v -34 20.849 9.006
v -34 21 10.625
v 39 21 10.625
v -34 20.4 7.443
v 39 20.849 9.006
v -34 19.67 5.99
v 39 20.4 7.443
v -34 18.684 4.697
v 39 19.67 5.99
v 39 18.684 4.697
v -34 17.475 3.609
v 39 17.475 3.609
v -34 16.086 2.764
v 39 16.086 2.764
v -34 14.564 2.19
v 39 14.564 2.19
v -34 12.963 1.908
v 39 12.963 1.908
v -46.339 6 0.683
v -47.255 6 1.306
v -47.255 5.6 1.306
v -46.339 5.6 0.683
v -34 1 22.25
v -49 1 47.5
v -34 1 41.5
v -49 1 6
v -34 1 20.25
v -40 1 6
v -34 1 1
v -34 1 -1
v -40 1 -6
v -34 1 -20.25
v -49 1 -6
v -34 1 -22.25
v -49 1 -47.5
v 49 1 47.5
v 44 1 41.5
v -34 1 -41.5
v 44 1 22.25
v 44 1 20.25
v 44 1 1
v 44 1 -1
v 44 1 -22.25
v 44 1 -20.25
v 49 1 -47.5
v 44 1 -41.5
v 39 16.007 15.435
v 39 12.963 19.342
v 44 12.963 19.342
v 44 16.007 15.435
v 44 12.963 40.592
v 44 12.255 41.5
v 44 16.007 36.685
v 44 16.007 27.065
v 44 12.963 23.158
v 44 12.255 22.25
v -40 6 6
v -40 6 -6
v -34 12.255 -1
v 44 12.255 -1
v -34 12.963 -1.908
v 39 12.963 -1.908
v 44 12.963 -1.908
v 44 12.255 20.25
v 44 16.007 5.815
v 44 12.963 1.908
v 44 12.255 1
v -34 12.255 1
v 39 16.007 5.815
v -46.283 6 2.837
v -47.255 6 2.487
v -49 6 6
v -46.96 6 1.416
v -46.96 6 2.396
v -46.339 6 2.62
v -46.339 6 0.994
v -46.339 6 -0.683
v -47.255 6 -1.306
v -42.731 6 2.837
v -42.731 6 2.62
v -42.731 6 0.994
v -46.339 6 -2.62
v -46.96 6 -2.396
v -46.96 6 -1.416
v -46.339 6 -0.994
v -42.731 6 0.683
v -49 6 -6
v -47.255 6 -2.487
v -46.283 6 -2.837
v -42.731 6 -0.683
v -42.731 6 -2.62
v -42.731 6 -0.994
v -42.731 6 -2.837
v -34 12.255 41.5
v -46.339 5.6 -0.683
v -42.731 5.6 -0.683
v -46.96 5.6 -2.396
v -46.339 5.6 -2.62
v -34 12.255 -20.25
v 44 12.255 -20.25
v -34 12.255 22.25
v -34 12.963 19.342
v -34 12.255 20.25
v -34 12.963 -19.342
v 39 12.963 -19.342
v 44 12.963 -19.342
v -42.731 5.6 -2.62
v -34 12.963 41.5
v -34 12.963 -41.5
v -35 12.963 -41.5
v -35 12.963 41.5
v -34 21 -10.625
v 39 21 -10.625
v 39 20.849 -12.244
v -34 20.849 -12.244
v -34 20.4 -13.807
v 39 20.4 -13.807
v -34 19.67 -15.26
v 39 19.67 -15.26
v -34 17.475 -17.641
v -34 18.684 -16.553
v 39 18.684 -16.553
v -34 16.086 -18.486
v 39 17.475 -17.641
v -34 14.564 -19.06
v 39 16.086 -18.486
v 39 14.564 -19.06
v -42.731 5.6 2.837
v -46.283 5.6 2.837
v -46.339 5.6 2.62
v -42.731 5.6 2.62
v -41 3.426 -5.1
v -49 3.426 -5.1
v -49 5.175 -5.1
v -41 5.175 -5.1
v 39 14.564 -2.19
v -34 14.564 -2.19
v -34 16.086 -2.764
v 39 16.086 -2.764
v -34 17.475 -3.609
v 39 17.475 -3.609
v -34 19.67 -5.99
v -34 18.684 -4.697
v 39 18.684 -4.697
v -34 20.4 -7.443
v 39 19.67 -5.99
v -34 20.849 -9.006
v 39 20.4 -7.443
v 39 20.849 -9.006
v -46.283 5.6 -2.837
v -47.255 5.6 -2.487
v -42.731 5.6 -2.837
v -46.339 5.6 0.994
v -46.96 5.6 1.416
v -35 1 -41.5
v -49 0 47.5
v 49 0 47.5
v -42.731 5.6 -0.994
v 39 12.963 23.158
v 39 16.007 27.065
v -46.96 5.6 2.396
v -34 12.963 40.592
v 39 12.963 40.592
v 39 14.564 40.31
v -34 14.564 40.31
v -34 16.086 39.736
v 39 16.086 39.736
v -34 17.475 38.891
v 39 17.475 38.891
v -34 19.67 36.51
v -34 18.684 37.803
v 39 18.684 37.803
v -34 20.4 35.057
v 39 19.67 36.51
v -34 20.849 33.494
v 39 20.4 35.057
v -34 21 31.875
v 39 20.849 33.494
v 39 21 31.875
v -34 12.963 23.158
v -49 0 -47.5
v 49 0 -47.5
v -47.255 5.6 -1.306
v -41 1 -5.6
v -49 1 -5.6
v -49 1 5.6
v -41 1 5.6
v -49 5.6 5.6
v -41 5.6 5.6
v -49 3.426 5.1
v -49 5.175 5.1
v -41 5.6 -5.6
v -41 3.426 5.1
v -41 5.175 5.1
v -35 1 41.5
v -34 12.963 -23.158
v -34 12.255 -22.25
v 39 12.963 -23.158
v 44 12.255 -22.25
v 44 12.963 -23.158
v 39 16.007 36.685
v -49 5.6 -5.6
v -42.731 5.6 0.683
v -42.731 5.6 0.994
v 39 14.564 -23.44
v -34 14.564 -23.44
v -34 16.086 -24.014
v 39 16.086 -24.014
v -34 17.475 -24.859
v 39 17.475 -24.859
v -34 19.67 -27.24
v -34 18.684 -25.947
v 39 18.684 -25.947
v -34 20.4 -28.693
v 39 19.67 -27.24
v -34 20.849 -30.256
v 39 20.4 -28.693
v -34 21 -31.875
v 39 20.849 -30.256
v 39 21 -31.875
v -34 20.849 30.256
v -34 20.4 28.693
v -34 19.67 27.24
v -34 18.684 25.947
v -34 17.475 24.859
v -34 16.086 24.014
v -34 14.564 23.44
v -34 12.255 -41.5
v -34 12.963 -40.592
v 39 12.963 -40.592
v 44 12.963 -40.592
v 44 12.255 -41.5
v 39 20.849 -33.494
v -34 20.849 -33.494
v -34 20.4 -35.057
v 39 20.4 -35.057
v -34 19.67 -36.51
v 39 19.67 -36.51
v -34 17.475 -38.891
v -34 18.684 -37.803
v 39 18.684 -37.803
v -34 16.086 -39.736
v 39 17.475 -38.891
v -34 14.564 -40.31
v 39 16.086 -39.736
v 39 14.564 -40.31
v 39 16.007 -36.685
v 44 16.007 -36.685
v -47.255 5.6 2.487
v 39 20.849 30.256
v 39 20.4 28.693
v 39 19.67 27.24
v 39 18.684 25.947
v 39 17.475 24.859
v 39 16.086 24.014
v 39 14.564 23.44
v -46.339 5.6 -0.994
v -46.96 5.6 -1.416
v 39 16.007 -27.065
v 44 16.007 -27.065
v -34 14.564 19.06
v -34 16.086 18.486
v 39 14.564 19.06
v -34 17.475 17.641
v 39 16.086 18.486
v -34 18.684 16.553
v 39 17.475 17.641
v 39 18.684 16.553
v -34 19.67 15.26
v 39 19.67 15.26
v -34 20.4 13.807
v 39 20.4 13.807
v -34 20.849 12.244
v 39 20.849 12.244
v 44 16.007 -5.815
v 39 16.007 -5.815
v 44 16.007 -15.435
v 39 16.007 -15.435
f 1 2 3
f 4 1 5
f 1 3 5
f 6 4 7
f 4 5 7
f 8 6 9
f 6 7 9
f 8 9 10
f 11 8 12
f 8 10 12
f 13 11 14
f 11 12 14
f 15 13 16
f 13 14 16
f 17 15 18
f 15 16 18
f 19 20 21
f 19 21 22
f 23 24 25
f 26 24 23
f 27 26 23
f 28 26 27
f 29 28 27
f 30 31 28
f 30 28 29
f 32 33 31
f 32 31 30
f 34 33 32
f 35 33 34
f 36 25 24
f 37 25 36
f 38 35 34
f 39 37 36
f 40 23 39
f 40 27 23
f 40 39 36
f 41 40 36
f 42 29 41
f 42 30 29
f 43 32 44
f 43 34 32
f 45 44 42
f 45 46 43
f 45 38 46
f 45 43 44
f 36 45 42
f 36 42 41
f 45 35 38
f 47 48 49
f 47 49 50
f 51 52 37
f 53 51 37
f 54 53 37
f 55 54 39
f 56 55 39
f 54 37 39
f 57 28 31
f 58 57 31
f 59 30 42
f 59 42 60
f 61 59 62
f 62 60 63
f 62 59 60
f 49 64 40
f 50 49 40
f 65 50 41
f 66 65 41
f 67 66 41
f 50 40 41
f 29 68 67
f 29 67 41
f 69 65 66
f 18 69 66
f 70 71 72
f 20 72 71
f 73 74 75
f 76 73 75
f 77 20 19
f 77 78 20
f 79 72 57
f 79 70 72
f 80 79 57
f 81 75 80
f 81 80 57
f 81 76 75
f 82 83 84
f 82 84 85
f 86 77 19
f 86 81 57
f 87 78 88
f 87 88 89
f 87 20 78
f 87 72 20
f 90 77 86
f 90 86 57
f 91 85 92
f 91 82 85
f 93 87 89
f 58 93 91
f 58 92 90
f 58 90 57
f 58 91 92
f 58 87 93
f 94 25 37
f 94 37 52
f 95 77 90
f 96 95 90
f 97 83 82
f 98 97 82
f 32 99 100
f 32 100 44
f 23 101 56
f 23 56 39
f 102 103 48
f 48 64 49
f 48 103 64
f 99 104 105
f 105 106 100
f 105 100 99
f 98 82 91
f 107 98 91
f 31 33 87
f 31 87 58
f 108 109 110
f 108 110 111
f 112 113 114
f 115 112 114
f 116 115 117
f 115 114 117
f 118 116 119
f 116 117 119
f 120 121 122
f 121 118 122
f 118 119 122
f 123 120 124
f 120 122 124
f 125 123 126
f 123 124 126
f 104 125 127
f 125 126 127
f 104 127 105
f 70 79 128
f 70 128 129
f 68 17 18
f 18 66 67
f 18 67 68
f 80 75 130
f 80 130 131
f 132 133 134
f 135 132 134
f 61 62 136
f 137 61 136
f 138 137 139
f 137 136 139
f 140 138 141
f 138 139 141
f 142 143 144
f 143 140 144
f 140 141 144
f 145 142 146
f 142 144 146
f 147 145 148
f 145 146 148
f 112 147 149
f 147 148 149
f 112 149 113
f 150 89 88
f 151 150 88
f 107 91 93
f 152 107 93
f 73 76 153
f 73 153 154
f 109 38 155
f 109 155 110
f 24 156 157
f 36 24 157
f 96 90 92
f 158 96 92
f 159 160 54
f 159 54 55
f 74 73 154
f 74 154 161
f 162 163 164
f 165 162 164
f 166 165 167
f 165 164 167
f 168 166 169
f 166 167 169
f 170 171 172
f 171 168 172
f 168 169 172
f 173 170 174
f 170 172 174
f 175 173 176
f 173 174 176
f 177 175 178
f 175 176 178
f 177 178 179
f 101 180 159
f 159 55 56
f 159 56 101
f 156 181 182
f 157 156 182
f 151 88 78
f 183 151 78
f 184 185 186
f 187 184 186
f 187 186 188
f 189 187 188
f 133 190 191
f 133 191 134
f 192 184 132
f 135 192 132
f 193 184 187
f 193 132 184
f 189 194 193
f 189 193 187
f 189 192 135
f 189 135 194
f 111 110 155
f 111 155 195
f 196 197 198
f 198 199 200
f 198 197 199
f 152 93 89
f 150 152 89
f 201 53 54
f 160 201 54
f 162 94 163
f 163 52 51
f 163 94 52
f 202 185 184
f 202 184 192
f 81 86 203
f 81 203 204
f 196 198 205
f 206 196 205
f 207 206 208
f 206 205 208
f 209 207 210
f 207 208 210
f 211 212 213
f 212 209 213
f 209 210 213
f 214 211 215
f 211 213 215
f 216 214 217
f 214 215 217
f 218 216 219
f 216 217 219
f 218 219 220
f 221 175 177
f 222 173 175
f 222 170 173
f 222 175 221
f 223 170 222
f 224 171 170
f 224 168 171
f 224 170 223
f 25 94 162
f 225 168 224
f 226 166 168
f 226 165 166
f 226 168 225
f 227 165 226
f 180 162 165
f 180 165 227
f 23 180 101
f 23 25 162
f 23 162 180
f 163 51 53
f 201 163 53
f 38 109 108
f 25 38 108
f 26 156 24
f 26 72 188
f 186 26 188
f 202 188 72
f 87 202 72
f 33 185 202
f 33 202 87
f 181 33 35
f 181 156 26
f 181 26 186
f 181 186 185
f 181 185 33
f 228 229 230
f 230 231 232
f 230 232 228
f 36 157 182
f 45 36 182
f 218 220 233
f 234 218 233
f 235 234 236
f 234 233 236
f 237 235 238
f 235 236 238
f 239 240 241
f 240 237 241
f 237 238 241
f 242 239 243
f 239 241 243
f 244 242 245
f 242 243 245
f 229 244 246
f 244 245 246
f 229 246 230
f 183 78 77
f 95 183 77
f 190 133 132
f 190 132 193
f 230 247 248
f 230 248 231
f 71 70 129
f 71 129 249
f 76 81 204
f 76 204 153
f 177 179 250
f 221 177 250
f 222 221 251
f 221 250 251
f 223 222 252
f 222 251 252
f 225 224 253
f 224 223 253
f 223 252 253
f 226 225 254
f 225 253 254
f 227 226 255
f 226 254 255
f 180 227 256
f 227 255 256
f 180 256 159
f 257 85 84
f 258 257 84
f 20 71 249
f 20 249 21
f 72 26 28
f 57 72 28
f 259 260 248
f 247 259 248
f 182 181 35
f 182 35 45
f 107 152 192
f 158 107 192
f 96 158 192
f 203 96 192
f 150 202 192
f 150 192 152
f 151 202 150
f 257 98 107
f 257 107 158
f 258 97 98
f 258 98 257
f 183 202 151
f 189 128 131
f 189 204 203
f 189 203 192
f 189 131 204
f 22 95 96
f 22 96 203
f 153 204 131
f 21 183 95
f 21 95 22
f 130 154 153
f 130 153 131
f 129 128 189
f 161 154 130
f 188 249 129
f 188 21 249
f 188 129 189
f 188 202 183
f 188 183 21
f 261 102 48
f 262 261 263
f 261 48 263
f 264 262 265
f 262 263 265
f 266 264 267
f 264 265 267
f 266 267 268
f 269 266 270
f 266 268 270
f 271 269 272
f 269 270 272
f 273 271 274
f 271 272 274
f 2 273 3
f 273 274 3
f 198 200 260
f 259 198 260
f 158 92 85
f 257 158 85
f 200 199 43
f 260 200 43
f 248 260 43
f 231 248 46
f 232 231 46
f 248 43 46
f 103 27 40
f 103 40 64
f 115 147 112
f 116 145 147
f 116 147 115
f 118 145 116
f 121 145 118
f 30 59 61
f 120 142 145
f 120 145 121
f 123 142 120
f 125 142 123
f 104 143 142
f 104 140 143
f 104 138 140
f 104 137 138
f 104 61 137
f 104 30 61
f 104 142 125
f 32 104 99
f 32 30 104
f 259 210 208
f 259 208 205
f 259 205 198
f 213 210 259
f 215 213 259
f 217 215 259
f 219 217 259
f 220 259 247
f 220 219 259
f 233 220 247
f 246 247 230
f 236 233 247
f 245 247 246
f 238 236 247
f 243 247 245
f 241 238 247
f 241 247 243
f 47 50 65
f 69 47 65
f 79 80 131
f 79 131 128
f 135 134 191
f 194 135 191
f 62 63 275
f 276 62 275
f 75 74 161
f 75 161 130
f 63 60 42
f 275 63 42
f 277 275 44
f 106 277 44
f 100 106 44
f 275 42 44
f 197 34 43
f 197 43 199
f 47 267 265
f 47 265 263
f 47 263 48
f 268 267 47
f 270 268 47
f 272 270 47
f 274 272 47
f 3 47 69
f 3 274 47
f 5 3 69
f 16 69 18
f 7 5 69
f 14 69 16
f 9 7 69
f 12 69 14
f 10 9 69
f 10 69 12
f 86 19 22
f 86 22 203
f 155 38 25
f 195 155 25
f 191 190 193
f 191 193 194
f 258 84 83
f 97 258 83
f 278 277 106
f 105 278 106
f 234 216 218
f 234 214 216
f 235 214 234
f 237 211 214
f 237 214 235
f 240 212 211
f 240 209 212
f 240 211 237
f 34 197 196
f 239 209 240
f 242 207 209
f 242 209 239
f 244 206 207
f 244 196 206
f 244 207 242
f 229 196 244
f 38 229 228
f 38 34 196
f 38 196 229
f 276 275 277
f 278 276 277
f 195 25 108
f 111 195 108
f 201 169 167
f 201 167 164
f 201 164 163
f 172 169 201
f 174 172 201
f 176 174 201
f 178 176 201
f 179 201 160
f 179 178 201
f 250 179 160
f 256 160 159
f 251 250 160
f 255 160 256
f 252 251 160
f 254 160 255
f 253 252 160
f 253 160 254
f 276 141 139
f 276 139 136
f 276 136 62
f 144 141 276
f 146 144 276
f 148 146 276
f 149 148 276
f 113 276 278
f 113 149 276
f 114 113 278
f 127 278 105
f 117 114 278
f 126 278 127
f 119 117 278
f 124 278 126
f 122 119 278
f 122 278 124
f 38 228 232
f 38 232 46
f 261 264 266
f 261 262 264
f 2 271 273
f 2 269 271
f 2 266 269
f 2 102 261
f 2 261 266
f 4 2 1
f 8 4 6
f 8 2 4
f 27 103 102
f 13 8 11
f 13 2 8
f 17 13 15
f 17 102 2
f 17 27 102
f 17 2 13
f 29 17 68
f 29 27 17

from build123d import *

# Parameters (mm, degrees)
SKETCH_1_W          = 98
SKETCH_1_H          = 95
EXTRUDE_1_DEPTH     = 1
SKETCH_2_W          = 78
SKETCH_2_H          = 85
EXTRUDE_2_DEPTH     = 20
CUT_EXTRUDE_1_DEPTH = 100
CUT_EXTRUDE_2_DEPTH = 5
SKETCH_5_W          = 9
SKETCH_5_H          = 12
EXTRUDE_3_DEPTH     = 5
SKETCH_6_W          = 11.2
SKETCH_6_H          = 4.6
SKETCH_6_W_2        = 10.2
SKETCH_6_H_2        = 1.749108458
CUT_EXTRUDE_4_DEPTH = 8
CUT_EXTRUDE_5_DEPTH = 0.5
SKETCH_8_W          = 83
SKETCH_8_H          = 11.962724137
EXTRUDE_4_DEPTH     = 1


with BuildPart() as part:
    # 스케치1 → 보스-돌출1 (new body)
    with BuildSketch(Plane(origin=(0, 0, 0), x_dir=(1, 0, 0), z_dir=(0, 1, 0))):
        Rectangle(SKETCH_1_W, SKETCH_1_H)
    extrude(amount=EXTRUDE_1_DEPTH)

    # 스케치2 → 보스-돌출2 (add)
    with BuildSketch(Plane(origin=(0, 1, 0), x_dir=(1, 0, 0), z_dir=(0, 1, 0))):
        with Locations((5, 0)):
            Rectangle(SKETCH_2_W, SKETCH_2_H)
    extrude(amount=EXTRUDE_2_DEPTH)

    # 스케치4 → 컷-돌출1 (cut)
    with BuildSketch(Plane(origin=(44, 0, 0), x_dir=(0, 0, -1), z_dir=(1, 0, 0))):
        with BuildLine():
            Line((-42.5, 1), (-41.5, 1))
            Line((-41.5, 1), (-41.5, 12.254740451))
            Line((-41.5, 12.254740451), (-40.591554577, 12.962724137))
            ThreePointArc((-40.591554577, 12.962724137), (-37.80324019, 18.684012014), (-31.875, 21))
            Line((-31.875, 21), (-42.5, 21))
            Line((-42.5, 21), (-42.5, 1))
        make_face()
        with BuildLine():
            Line((-22.25, 12.254740451), (-22.25, 1))
            Line((-22.25, 1), (-20.25, 1))
            Line((-20.25, 1), (-20.25, 12.254740451))
            Line((-20.25, 12.254740451), (-19.341554577, 12.962724137))
            ThreePointArc((-19.341554577, 12.962724137), (-16.553240185, 18.684012019), (-10.624999986, 21))
            Line((-10.624999986, 21), (-31.875, 21))
            ThreePointArc((-31.875, 21), (-25.94675981, 18.684012014), (-23.158445423, 12.962724137))
            Line((-23.158445423, 12.962724137), (-22.25, 12.254740451))
        make_face()
        with BuildLine():
            Line((-1, 12.254740451), (-1, 1))
            Line((-1, 1), (1, 1))
            Line((1, 1), (1, 12.254740451))
            Line((1, 12.254740451), (1.908445423, 12.962724137))
            ThreePointArc((1.908445423, 12.962724137), (4.696759796, 18.684012001), (10.62499996, 21))
            Line((10.62499996, 21), (-10.624999986, 21))
            ThreePointArc((-10.624999986, 21), (-4.696759805, 18.68401201), (-1.908445423, 12.962724137))
            Line((-1.908445423, 12.962724137), (-1, 12.254740451))
        make_face()
        with BuildLine():
            Line((20.25, 12.254740451), (20.25, 1))
            Line((20.25, 1), (22.25, 1))
            Line((22.25, 1), (22.25, 12.254740451))
            Line((22.25, 12.254740451), (23.158445423, 12.962724137))
            ThreePointArc((23.158445423, 12.962724137), (25.94675981, 18.684012014), (31.875, 21))
            Line((31.875, 21), (10.62499996, 21))
            ThreePointArc((10.62499996, 21), (16.553240175, 18.684012028), (19.341554577, 12.962724137))
            Line((19.341554577, 12.962724137), (20.25, 12.254740451))
        make_face()
        with BuildLine():
            Line((42.5, 21), (31.875, 21))
            ThreePointArc((31.875, 21), (37.80324019, 18.684012014), (40.591554577, 12.962724137))
            Line((40.591554577, 12.962724137), (41.5, 12.254740451))
            Line((41.5, 12.254740451), (41.5, 1))
            Line((41.5, 1), (42.5, 1))
            Line((42.5, 1), (42.5, 21))
        make_face()
    extrude(amount=-CUT_EXTRUDE_1_DEPTH, mode=Mode.SUBTRACT)

    # 스케치4<3> → 컷-돌출2 (cut)
    with BuildSketch(Plane(origin=(44, 0, 0), x_dir=(0, 0, -1), z_dir=(1, 0, 0))):
        with BuildLine():
            ThreePointArc((-23.158445423, 12.962724137), (-31.875, 21), (-40.591554577, 12.962724137))
            Line((-40.591554577, 12.962724137), (-36.685, 16.007240451))
            Line((-36.685, 16.007240451), (-27.065, 16.007240451))
            Line((-27.065, 16.007240451), (-23.158445423, 12.962724137))
        make_face()
        with BuildLine():
            Line((-5.815, 16.007240451), (-1.908445423, 12.962724137))
            ThreePointArc((-1.908445423, 12.962724137), (-10.625, 21), (-19.341554577, 12.962724137))
            Line((-19.341554577, 12.962724137), (-15.435, 16.007240451))
            Line((-15.435, 16.007240451), (-5.815, 16.007240451))
        make_face()
        with BuildLine():
            Line((15.435, 16.007240451), (19.341554577, 12.962724137))
            ThreePointArc((19.341554577, 12.962724137), (10.625, 21), (1.908445423, 12.962724137))
            Line((1.908445423, 12.962724137), (5.815, 16.007240451))
            Line((5.815, 16.007240451), (15.435, 16.007240451))
        make_face()
        with BuildLine():
            Line((36.685, 16.007240451), (40.591554577, 12.962724137))
            ThreePointArc((40.591554577, 12.962724137), (31.875, 21), (23.158445423, 12.962724137))
            Line((23.158445423, 12.962724137), (27.065, 16.007240451))
            Line((27.065, 16.007240451), (36.685, 16.007240451))
        make_face()
    extrude(amount=-CUT_EXTRUDE_2_DEPTH, mode=Mode.SUBTRACT)

    # 스케치5 → 보스-돌출3 (add)
    with BuildSketch(Plane(origin=(0, 1, 0), x_dir=(1, 0, 0), z_dir=(0, 1, 0))):
        with Locations((-44.5, 0)):
            Rectangle(SKETCH_5_W, SKETCH_5_H)
    extrude(amount=EXTRUDE_3_DEPTH)

    # 스케치6 → 컷-돌출4 (cut)
    with BuildSketch(Plane.ZY.offset(49)):
        with Locations((0, 3.3)):
            Rectangle(SKETCH_6_W, SKETCH_6_H)
        with Locations((0, 4.300145796)):
            Rectangle(SKETCH_6_W_2, SKETCH_6_H_2, mode=Mode.SUBTRACT)
    extrude(amount=-CUT_EXTRUDE_4_DEPTH, mode=Mode.SUBTRACT)

    # 스케치7 → 컷-돌출5 (cut)
    with BuildSketch(Plane(origin=(0, 6, 0), x_dir=(1, 0, 0), z_dir=(0, 1, 0))):
        Polygon((-42.731367286, 2.836850655), (-46.283445156, 2.836850655), (-47.255371975, 2.487236692), (-47.255371975, 1.305541495), (-46.33938339, 0.68322864), (-42.731367286, 0.68322864), (-42.731367286, 0.994385067), (-46.33938339, 0.994385067), (-46.960091467, 1.416087501), (-46.960091467, 2.396337061), (-46.33938339, 2.619613348), (-42.731367286, 2.619613348), align=None)
        Polygon((-42.731367286, -2.836850655), (-46.283445156, -2.836850655), (-47.255371975, -2.487236692), (-47.255371975, -1.305541495), (-46.33938339, -0.68322864), (-42.731367286, -0.68322864), (-42.731367286, -0.994385067), (-46.33938339, -0.994385067), (-46.960091467, -1.416087501), (-46.960091467, -2.396337061), (-46.33938339, -2.619613348), (-42.731367286, -2.619613348), align=None)
    extrude(amount=-CUT_EXTRUDE_5_DEPTH, mode=Mode.SUBTRACT)


with BuildPart() as body_2:
    # 스케치8 → 보스-돌출4 (new body)
    with BuildSketch(Plane.ZY.offset(34)):
        with Locations((0, 6.981362069)):
            Rectangle(SKETCH_8_W, SKETCH_8_H)
    extrude(amount=EXTRUDE_4_DEPTH)


solid = Compound([part.part, body_2.part])
